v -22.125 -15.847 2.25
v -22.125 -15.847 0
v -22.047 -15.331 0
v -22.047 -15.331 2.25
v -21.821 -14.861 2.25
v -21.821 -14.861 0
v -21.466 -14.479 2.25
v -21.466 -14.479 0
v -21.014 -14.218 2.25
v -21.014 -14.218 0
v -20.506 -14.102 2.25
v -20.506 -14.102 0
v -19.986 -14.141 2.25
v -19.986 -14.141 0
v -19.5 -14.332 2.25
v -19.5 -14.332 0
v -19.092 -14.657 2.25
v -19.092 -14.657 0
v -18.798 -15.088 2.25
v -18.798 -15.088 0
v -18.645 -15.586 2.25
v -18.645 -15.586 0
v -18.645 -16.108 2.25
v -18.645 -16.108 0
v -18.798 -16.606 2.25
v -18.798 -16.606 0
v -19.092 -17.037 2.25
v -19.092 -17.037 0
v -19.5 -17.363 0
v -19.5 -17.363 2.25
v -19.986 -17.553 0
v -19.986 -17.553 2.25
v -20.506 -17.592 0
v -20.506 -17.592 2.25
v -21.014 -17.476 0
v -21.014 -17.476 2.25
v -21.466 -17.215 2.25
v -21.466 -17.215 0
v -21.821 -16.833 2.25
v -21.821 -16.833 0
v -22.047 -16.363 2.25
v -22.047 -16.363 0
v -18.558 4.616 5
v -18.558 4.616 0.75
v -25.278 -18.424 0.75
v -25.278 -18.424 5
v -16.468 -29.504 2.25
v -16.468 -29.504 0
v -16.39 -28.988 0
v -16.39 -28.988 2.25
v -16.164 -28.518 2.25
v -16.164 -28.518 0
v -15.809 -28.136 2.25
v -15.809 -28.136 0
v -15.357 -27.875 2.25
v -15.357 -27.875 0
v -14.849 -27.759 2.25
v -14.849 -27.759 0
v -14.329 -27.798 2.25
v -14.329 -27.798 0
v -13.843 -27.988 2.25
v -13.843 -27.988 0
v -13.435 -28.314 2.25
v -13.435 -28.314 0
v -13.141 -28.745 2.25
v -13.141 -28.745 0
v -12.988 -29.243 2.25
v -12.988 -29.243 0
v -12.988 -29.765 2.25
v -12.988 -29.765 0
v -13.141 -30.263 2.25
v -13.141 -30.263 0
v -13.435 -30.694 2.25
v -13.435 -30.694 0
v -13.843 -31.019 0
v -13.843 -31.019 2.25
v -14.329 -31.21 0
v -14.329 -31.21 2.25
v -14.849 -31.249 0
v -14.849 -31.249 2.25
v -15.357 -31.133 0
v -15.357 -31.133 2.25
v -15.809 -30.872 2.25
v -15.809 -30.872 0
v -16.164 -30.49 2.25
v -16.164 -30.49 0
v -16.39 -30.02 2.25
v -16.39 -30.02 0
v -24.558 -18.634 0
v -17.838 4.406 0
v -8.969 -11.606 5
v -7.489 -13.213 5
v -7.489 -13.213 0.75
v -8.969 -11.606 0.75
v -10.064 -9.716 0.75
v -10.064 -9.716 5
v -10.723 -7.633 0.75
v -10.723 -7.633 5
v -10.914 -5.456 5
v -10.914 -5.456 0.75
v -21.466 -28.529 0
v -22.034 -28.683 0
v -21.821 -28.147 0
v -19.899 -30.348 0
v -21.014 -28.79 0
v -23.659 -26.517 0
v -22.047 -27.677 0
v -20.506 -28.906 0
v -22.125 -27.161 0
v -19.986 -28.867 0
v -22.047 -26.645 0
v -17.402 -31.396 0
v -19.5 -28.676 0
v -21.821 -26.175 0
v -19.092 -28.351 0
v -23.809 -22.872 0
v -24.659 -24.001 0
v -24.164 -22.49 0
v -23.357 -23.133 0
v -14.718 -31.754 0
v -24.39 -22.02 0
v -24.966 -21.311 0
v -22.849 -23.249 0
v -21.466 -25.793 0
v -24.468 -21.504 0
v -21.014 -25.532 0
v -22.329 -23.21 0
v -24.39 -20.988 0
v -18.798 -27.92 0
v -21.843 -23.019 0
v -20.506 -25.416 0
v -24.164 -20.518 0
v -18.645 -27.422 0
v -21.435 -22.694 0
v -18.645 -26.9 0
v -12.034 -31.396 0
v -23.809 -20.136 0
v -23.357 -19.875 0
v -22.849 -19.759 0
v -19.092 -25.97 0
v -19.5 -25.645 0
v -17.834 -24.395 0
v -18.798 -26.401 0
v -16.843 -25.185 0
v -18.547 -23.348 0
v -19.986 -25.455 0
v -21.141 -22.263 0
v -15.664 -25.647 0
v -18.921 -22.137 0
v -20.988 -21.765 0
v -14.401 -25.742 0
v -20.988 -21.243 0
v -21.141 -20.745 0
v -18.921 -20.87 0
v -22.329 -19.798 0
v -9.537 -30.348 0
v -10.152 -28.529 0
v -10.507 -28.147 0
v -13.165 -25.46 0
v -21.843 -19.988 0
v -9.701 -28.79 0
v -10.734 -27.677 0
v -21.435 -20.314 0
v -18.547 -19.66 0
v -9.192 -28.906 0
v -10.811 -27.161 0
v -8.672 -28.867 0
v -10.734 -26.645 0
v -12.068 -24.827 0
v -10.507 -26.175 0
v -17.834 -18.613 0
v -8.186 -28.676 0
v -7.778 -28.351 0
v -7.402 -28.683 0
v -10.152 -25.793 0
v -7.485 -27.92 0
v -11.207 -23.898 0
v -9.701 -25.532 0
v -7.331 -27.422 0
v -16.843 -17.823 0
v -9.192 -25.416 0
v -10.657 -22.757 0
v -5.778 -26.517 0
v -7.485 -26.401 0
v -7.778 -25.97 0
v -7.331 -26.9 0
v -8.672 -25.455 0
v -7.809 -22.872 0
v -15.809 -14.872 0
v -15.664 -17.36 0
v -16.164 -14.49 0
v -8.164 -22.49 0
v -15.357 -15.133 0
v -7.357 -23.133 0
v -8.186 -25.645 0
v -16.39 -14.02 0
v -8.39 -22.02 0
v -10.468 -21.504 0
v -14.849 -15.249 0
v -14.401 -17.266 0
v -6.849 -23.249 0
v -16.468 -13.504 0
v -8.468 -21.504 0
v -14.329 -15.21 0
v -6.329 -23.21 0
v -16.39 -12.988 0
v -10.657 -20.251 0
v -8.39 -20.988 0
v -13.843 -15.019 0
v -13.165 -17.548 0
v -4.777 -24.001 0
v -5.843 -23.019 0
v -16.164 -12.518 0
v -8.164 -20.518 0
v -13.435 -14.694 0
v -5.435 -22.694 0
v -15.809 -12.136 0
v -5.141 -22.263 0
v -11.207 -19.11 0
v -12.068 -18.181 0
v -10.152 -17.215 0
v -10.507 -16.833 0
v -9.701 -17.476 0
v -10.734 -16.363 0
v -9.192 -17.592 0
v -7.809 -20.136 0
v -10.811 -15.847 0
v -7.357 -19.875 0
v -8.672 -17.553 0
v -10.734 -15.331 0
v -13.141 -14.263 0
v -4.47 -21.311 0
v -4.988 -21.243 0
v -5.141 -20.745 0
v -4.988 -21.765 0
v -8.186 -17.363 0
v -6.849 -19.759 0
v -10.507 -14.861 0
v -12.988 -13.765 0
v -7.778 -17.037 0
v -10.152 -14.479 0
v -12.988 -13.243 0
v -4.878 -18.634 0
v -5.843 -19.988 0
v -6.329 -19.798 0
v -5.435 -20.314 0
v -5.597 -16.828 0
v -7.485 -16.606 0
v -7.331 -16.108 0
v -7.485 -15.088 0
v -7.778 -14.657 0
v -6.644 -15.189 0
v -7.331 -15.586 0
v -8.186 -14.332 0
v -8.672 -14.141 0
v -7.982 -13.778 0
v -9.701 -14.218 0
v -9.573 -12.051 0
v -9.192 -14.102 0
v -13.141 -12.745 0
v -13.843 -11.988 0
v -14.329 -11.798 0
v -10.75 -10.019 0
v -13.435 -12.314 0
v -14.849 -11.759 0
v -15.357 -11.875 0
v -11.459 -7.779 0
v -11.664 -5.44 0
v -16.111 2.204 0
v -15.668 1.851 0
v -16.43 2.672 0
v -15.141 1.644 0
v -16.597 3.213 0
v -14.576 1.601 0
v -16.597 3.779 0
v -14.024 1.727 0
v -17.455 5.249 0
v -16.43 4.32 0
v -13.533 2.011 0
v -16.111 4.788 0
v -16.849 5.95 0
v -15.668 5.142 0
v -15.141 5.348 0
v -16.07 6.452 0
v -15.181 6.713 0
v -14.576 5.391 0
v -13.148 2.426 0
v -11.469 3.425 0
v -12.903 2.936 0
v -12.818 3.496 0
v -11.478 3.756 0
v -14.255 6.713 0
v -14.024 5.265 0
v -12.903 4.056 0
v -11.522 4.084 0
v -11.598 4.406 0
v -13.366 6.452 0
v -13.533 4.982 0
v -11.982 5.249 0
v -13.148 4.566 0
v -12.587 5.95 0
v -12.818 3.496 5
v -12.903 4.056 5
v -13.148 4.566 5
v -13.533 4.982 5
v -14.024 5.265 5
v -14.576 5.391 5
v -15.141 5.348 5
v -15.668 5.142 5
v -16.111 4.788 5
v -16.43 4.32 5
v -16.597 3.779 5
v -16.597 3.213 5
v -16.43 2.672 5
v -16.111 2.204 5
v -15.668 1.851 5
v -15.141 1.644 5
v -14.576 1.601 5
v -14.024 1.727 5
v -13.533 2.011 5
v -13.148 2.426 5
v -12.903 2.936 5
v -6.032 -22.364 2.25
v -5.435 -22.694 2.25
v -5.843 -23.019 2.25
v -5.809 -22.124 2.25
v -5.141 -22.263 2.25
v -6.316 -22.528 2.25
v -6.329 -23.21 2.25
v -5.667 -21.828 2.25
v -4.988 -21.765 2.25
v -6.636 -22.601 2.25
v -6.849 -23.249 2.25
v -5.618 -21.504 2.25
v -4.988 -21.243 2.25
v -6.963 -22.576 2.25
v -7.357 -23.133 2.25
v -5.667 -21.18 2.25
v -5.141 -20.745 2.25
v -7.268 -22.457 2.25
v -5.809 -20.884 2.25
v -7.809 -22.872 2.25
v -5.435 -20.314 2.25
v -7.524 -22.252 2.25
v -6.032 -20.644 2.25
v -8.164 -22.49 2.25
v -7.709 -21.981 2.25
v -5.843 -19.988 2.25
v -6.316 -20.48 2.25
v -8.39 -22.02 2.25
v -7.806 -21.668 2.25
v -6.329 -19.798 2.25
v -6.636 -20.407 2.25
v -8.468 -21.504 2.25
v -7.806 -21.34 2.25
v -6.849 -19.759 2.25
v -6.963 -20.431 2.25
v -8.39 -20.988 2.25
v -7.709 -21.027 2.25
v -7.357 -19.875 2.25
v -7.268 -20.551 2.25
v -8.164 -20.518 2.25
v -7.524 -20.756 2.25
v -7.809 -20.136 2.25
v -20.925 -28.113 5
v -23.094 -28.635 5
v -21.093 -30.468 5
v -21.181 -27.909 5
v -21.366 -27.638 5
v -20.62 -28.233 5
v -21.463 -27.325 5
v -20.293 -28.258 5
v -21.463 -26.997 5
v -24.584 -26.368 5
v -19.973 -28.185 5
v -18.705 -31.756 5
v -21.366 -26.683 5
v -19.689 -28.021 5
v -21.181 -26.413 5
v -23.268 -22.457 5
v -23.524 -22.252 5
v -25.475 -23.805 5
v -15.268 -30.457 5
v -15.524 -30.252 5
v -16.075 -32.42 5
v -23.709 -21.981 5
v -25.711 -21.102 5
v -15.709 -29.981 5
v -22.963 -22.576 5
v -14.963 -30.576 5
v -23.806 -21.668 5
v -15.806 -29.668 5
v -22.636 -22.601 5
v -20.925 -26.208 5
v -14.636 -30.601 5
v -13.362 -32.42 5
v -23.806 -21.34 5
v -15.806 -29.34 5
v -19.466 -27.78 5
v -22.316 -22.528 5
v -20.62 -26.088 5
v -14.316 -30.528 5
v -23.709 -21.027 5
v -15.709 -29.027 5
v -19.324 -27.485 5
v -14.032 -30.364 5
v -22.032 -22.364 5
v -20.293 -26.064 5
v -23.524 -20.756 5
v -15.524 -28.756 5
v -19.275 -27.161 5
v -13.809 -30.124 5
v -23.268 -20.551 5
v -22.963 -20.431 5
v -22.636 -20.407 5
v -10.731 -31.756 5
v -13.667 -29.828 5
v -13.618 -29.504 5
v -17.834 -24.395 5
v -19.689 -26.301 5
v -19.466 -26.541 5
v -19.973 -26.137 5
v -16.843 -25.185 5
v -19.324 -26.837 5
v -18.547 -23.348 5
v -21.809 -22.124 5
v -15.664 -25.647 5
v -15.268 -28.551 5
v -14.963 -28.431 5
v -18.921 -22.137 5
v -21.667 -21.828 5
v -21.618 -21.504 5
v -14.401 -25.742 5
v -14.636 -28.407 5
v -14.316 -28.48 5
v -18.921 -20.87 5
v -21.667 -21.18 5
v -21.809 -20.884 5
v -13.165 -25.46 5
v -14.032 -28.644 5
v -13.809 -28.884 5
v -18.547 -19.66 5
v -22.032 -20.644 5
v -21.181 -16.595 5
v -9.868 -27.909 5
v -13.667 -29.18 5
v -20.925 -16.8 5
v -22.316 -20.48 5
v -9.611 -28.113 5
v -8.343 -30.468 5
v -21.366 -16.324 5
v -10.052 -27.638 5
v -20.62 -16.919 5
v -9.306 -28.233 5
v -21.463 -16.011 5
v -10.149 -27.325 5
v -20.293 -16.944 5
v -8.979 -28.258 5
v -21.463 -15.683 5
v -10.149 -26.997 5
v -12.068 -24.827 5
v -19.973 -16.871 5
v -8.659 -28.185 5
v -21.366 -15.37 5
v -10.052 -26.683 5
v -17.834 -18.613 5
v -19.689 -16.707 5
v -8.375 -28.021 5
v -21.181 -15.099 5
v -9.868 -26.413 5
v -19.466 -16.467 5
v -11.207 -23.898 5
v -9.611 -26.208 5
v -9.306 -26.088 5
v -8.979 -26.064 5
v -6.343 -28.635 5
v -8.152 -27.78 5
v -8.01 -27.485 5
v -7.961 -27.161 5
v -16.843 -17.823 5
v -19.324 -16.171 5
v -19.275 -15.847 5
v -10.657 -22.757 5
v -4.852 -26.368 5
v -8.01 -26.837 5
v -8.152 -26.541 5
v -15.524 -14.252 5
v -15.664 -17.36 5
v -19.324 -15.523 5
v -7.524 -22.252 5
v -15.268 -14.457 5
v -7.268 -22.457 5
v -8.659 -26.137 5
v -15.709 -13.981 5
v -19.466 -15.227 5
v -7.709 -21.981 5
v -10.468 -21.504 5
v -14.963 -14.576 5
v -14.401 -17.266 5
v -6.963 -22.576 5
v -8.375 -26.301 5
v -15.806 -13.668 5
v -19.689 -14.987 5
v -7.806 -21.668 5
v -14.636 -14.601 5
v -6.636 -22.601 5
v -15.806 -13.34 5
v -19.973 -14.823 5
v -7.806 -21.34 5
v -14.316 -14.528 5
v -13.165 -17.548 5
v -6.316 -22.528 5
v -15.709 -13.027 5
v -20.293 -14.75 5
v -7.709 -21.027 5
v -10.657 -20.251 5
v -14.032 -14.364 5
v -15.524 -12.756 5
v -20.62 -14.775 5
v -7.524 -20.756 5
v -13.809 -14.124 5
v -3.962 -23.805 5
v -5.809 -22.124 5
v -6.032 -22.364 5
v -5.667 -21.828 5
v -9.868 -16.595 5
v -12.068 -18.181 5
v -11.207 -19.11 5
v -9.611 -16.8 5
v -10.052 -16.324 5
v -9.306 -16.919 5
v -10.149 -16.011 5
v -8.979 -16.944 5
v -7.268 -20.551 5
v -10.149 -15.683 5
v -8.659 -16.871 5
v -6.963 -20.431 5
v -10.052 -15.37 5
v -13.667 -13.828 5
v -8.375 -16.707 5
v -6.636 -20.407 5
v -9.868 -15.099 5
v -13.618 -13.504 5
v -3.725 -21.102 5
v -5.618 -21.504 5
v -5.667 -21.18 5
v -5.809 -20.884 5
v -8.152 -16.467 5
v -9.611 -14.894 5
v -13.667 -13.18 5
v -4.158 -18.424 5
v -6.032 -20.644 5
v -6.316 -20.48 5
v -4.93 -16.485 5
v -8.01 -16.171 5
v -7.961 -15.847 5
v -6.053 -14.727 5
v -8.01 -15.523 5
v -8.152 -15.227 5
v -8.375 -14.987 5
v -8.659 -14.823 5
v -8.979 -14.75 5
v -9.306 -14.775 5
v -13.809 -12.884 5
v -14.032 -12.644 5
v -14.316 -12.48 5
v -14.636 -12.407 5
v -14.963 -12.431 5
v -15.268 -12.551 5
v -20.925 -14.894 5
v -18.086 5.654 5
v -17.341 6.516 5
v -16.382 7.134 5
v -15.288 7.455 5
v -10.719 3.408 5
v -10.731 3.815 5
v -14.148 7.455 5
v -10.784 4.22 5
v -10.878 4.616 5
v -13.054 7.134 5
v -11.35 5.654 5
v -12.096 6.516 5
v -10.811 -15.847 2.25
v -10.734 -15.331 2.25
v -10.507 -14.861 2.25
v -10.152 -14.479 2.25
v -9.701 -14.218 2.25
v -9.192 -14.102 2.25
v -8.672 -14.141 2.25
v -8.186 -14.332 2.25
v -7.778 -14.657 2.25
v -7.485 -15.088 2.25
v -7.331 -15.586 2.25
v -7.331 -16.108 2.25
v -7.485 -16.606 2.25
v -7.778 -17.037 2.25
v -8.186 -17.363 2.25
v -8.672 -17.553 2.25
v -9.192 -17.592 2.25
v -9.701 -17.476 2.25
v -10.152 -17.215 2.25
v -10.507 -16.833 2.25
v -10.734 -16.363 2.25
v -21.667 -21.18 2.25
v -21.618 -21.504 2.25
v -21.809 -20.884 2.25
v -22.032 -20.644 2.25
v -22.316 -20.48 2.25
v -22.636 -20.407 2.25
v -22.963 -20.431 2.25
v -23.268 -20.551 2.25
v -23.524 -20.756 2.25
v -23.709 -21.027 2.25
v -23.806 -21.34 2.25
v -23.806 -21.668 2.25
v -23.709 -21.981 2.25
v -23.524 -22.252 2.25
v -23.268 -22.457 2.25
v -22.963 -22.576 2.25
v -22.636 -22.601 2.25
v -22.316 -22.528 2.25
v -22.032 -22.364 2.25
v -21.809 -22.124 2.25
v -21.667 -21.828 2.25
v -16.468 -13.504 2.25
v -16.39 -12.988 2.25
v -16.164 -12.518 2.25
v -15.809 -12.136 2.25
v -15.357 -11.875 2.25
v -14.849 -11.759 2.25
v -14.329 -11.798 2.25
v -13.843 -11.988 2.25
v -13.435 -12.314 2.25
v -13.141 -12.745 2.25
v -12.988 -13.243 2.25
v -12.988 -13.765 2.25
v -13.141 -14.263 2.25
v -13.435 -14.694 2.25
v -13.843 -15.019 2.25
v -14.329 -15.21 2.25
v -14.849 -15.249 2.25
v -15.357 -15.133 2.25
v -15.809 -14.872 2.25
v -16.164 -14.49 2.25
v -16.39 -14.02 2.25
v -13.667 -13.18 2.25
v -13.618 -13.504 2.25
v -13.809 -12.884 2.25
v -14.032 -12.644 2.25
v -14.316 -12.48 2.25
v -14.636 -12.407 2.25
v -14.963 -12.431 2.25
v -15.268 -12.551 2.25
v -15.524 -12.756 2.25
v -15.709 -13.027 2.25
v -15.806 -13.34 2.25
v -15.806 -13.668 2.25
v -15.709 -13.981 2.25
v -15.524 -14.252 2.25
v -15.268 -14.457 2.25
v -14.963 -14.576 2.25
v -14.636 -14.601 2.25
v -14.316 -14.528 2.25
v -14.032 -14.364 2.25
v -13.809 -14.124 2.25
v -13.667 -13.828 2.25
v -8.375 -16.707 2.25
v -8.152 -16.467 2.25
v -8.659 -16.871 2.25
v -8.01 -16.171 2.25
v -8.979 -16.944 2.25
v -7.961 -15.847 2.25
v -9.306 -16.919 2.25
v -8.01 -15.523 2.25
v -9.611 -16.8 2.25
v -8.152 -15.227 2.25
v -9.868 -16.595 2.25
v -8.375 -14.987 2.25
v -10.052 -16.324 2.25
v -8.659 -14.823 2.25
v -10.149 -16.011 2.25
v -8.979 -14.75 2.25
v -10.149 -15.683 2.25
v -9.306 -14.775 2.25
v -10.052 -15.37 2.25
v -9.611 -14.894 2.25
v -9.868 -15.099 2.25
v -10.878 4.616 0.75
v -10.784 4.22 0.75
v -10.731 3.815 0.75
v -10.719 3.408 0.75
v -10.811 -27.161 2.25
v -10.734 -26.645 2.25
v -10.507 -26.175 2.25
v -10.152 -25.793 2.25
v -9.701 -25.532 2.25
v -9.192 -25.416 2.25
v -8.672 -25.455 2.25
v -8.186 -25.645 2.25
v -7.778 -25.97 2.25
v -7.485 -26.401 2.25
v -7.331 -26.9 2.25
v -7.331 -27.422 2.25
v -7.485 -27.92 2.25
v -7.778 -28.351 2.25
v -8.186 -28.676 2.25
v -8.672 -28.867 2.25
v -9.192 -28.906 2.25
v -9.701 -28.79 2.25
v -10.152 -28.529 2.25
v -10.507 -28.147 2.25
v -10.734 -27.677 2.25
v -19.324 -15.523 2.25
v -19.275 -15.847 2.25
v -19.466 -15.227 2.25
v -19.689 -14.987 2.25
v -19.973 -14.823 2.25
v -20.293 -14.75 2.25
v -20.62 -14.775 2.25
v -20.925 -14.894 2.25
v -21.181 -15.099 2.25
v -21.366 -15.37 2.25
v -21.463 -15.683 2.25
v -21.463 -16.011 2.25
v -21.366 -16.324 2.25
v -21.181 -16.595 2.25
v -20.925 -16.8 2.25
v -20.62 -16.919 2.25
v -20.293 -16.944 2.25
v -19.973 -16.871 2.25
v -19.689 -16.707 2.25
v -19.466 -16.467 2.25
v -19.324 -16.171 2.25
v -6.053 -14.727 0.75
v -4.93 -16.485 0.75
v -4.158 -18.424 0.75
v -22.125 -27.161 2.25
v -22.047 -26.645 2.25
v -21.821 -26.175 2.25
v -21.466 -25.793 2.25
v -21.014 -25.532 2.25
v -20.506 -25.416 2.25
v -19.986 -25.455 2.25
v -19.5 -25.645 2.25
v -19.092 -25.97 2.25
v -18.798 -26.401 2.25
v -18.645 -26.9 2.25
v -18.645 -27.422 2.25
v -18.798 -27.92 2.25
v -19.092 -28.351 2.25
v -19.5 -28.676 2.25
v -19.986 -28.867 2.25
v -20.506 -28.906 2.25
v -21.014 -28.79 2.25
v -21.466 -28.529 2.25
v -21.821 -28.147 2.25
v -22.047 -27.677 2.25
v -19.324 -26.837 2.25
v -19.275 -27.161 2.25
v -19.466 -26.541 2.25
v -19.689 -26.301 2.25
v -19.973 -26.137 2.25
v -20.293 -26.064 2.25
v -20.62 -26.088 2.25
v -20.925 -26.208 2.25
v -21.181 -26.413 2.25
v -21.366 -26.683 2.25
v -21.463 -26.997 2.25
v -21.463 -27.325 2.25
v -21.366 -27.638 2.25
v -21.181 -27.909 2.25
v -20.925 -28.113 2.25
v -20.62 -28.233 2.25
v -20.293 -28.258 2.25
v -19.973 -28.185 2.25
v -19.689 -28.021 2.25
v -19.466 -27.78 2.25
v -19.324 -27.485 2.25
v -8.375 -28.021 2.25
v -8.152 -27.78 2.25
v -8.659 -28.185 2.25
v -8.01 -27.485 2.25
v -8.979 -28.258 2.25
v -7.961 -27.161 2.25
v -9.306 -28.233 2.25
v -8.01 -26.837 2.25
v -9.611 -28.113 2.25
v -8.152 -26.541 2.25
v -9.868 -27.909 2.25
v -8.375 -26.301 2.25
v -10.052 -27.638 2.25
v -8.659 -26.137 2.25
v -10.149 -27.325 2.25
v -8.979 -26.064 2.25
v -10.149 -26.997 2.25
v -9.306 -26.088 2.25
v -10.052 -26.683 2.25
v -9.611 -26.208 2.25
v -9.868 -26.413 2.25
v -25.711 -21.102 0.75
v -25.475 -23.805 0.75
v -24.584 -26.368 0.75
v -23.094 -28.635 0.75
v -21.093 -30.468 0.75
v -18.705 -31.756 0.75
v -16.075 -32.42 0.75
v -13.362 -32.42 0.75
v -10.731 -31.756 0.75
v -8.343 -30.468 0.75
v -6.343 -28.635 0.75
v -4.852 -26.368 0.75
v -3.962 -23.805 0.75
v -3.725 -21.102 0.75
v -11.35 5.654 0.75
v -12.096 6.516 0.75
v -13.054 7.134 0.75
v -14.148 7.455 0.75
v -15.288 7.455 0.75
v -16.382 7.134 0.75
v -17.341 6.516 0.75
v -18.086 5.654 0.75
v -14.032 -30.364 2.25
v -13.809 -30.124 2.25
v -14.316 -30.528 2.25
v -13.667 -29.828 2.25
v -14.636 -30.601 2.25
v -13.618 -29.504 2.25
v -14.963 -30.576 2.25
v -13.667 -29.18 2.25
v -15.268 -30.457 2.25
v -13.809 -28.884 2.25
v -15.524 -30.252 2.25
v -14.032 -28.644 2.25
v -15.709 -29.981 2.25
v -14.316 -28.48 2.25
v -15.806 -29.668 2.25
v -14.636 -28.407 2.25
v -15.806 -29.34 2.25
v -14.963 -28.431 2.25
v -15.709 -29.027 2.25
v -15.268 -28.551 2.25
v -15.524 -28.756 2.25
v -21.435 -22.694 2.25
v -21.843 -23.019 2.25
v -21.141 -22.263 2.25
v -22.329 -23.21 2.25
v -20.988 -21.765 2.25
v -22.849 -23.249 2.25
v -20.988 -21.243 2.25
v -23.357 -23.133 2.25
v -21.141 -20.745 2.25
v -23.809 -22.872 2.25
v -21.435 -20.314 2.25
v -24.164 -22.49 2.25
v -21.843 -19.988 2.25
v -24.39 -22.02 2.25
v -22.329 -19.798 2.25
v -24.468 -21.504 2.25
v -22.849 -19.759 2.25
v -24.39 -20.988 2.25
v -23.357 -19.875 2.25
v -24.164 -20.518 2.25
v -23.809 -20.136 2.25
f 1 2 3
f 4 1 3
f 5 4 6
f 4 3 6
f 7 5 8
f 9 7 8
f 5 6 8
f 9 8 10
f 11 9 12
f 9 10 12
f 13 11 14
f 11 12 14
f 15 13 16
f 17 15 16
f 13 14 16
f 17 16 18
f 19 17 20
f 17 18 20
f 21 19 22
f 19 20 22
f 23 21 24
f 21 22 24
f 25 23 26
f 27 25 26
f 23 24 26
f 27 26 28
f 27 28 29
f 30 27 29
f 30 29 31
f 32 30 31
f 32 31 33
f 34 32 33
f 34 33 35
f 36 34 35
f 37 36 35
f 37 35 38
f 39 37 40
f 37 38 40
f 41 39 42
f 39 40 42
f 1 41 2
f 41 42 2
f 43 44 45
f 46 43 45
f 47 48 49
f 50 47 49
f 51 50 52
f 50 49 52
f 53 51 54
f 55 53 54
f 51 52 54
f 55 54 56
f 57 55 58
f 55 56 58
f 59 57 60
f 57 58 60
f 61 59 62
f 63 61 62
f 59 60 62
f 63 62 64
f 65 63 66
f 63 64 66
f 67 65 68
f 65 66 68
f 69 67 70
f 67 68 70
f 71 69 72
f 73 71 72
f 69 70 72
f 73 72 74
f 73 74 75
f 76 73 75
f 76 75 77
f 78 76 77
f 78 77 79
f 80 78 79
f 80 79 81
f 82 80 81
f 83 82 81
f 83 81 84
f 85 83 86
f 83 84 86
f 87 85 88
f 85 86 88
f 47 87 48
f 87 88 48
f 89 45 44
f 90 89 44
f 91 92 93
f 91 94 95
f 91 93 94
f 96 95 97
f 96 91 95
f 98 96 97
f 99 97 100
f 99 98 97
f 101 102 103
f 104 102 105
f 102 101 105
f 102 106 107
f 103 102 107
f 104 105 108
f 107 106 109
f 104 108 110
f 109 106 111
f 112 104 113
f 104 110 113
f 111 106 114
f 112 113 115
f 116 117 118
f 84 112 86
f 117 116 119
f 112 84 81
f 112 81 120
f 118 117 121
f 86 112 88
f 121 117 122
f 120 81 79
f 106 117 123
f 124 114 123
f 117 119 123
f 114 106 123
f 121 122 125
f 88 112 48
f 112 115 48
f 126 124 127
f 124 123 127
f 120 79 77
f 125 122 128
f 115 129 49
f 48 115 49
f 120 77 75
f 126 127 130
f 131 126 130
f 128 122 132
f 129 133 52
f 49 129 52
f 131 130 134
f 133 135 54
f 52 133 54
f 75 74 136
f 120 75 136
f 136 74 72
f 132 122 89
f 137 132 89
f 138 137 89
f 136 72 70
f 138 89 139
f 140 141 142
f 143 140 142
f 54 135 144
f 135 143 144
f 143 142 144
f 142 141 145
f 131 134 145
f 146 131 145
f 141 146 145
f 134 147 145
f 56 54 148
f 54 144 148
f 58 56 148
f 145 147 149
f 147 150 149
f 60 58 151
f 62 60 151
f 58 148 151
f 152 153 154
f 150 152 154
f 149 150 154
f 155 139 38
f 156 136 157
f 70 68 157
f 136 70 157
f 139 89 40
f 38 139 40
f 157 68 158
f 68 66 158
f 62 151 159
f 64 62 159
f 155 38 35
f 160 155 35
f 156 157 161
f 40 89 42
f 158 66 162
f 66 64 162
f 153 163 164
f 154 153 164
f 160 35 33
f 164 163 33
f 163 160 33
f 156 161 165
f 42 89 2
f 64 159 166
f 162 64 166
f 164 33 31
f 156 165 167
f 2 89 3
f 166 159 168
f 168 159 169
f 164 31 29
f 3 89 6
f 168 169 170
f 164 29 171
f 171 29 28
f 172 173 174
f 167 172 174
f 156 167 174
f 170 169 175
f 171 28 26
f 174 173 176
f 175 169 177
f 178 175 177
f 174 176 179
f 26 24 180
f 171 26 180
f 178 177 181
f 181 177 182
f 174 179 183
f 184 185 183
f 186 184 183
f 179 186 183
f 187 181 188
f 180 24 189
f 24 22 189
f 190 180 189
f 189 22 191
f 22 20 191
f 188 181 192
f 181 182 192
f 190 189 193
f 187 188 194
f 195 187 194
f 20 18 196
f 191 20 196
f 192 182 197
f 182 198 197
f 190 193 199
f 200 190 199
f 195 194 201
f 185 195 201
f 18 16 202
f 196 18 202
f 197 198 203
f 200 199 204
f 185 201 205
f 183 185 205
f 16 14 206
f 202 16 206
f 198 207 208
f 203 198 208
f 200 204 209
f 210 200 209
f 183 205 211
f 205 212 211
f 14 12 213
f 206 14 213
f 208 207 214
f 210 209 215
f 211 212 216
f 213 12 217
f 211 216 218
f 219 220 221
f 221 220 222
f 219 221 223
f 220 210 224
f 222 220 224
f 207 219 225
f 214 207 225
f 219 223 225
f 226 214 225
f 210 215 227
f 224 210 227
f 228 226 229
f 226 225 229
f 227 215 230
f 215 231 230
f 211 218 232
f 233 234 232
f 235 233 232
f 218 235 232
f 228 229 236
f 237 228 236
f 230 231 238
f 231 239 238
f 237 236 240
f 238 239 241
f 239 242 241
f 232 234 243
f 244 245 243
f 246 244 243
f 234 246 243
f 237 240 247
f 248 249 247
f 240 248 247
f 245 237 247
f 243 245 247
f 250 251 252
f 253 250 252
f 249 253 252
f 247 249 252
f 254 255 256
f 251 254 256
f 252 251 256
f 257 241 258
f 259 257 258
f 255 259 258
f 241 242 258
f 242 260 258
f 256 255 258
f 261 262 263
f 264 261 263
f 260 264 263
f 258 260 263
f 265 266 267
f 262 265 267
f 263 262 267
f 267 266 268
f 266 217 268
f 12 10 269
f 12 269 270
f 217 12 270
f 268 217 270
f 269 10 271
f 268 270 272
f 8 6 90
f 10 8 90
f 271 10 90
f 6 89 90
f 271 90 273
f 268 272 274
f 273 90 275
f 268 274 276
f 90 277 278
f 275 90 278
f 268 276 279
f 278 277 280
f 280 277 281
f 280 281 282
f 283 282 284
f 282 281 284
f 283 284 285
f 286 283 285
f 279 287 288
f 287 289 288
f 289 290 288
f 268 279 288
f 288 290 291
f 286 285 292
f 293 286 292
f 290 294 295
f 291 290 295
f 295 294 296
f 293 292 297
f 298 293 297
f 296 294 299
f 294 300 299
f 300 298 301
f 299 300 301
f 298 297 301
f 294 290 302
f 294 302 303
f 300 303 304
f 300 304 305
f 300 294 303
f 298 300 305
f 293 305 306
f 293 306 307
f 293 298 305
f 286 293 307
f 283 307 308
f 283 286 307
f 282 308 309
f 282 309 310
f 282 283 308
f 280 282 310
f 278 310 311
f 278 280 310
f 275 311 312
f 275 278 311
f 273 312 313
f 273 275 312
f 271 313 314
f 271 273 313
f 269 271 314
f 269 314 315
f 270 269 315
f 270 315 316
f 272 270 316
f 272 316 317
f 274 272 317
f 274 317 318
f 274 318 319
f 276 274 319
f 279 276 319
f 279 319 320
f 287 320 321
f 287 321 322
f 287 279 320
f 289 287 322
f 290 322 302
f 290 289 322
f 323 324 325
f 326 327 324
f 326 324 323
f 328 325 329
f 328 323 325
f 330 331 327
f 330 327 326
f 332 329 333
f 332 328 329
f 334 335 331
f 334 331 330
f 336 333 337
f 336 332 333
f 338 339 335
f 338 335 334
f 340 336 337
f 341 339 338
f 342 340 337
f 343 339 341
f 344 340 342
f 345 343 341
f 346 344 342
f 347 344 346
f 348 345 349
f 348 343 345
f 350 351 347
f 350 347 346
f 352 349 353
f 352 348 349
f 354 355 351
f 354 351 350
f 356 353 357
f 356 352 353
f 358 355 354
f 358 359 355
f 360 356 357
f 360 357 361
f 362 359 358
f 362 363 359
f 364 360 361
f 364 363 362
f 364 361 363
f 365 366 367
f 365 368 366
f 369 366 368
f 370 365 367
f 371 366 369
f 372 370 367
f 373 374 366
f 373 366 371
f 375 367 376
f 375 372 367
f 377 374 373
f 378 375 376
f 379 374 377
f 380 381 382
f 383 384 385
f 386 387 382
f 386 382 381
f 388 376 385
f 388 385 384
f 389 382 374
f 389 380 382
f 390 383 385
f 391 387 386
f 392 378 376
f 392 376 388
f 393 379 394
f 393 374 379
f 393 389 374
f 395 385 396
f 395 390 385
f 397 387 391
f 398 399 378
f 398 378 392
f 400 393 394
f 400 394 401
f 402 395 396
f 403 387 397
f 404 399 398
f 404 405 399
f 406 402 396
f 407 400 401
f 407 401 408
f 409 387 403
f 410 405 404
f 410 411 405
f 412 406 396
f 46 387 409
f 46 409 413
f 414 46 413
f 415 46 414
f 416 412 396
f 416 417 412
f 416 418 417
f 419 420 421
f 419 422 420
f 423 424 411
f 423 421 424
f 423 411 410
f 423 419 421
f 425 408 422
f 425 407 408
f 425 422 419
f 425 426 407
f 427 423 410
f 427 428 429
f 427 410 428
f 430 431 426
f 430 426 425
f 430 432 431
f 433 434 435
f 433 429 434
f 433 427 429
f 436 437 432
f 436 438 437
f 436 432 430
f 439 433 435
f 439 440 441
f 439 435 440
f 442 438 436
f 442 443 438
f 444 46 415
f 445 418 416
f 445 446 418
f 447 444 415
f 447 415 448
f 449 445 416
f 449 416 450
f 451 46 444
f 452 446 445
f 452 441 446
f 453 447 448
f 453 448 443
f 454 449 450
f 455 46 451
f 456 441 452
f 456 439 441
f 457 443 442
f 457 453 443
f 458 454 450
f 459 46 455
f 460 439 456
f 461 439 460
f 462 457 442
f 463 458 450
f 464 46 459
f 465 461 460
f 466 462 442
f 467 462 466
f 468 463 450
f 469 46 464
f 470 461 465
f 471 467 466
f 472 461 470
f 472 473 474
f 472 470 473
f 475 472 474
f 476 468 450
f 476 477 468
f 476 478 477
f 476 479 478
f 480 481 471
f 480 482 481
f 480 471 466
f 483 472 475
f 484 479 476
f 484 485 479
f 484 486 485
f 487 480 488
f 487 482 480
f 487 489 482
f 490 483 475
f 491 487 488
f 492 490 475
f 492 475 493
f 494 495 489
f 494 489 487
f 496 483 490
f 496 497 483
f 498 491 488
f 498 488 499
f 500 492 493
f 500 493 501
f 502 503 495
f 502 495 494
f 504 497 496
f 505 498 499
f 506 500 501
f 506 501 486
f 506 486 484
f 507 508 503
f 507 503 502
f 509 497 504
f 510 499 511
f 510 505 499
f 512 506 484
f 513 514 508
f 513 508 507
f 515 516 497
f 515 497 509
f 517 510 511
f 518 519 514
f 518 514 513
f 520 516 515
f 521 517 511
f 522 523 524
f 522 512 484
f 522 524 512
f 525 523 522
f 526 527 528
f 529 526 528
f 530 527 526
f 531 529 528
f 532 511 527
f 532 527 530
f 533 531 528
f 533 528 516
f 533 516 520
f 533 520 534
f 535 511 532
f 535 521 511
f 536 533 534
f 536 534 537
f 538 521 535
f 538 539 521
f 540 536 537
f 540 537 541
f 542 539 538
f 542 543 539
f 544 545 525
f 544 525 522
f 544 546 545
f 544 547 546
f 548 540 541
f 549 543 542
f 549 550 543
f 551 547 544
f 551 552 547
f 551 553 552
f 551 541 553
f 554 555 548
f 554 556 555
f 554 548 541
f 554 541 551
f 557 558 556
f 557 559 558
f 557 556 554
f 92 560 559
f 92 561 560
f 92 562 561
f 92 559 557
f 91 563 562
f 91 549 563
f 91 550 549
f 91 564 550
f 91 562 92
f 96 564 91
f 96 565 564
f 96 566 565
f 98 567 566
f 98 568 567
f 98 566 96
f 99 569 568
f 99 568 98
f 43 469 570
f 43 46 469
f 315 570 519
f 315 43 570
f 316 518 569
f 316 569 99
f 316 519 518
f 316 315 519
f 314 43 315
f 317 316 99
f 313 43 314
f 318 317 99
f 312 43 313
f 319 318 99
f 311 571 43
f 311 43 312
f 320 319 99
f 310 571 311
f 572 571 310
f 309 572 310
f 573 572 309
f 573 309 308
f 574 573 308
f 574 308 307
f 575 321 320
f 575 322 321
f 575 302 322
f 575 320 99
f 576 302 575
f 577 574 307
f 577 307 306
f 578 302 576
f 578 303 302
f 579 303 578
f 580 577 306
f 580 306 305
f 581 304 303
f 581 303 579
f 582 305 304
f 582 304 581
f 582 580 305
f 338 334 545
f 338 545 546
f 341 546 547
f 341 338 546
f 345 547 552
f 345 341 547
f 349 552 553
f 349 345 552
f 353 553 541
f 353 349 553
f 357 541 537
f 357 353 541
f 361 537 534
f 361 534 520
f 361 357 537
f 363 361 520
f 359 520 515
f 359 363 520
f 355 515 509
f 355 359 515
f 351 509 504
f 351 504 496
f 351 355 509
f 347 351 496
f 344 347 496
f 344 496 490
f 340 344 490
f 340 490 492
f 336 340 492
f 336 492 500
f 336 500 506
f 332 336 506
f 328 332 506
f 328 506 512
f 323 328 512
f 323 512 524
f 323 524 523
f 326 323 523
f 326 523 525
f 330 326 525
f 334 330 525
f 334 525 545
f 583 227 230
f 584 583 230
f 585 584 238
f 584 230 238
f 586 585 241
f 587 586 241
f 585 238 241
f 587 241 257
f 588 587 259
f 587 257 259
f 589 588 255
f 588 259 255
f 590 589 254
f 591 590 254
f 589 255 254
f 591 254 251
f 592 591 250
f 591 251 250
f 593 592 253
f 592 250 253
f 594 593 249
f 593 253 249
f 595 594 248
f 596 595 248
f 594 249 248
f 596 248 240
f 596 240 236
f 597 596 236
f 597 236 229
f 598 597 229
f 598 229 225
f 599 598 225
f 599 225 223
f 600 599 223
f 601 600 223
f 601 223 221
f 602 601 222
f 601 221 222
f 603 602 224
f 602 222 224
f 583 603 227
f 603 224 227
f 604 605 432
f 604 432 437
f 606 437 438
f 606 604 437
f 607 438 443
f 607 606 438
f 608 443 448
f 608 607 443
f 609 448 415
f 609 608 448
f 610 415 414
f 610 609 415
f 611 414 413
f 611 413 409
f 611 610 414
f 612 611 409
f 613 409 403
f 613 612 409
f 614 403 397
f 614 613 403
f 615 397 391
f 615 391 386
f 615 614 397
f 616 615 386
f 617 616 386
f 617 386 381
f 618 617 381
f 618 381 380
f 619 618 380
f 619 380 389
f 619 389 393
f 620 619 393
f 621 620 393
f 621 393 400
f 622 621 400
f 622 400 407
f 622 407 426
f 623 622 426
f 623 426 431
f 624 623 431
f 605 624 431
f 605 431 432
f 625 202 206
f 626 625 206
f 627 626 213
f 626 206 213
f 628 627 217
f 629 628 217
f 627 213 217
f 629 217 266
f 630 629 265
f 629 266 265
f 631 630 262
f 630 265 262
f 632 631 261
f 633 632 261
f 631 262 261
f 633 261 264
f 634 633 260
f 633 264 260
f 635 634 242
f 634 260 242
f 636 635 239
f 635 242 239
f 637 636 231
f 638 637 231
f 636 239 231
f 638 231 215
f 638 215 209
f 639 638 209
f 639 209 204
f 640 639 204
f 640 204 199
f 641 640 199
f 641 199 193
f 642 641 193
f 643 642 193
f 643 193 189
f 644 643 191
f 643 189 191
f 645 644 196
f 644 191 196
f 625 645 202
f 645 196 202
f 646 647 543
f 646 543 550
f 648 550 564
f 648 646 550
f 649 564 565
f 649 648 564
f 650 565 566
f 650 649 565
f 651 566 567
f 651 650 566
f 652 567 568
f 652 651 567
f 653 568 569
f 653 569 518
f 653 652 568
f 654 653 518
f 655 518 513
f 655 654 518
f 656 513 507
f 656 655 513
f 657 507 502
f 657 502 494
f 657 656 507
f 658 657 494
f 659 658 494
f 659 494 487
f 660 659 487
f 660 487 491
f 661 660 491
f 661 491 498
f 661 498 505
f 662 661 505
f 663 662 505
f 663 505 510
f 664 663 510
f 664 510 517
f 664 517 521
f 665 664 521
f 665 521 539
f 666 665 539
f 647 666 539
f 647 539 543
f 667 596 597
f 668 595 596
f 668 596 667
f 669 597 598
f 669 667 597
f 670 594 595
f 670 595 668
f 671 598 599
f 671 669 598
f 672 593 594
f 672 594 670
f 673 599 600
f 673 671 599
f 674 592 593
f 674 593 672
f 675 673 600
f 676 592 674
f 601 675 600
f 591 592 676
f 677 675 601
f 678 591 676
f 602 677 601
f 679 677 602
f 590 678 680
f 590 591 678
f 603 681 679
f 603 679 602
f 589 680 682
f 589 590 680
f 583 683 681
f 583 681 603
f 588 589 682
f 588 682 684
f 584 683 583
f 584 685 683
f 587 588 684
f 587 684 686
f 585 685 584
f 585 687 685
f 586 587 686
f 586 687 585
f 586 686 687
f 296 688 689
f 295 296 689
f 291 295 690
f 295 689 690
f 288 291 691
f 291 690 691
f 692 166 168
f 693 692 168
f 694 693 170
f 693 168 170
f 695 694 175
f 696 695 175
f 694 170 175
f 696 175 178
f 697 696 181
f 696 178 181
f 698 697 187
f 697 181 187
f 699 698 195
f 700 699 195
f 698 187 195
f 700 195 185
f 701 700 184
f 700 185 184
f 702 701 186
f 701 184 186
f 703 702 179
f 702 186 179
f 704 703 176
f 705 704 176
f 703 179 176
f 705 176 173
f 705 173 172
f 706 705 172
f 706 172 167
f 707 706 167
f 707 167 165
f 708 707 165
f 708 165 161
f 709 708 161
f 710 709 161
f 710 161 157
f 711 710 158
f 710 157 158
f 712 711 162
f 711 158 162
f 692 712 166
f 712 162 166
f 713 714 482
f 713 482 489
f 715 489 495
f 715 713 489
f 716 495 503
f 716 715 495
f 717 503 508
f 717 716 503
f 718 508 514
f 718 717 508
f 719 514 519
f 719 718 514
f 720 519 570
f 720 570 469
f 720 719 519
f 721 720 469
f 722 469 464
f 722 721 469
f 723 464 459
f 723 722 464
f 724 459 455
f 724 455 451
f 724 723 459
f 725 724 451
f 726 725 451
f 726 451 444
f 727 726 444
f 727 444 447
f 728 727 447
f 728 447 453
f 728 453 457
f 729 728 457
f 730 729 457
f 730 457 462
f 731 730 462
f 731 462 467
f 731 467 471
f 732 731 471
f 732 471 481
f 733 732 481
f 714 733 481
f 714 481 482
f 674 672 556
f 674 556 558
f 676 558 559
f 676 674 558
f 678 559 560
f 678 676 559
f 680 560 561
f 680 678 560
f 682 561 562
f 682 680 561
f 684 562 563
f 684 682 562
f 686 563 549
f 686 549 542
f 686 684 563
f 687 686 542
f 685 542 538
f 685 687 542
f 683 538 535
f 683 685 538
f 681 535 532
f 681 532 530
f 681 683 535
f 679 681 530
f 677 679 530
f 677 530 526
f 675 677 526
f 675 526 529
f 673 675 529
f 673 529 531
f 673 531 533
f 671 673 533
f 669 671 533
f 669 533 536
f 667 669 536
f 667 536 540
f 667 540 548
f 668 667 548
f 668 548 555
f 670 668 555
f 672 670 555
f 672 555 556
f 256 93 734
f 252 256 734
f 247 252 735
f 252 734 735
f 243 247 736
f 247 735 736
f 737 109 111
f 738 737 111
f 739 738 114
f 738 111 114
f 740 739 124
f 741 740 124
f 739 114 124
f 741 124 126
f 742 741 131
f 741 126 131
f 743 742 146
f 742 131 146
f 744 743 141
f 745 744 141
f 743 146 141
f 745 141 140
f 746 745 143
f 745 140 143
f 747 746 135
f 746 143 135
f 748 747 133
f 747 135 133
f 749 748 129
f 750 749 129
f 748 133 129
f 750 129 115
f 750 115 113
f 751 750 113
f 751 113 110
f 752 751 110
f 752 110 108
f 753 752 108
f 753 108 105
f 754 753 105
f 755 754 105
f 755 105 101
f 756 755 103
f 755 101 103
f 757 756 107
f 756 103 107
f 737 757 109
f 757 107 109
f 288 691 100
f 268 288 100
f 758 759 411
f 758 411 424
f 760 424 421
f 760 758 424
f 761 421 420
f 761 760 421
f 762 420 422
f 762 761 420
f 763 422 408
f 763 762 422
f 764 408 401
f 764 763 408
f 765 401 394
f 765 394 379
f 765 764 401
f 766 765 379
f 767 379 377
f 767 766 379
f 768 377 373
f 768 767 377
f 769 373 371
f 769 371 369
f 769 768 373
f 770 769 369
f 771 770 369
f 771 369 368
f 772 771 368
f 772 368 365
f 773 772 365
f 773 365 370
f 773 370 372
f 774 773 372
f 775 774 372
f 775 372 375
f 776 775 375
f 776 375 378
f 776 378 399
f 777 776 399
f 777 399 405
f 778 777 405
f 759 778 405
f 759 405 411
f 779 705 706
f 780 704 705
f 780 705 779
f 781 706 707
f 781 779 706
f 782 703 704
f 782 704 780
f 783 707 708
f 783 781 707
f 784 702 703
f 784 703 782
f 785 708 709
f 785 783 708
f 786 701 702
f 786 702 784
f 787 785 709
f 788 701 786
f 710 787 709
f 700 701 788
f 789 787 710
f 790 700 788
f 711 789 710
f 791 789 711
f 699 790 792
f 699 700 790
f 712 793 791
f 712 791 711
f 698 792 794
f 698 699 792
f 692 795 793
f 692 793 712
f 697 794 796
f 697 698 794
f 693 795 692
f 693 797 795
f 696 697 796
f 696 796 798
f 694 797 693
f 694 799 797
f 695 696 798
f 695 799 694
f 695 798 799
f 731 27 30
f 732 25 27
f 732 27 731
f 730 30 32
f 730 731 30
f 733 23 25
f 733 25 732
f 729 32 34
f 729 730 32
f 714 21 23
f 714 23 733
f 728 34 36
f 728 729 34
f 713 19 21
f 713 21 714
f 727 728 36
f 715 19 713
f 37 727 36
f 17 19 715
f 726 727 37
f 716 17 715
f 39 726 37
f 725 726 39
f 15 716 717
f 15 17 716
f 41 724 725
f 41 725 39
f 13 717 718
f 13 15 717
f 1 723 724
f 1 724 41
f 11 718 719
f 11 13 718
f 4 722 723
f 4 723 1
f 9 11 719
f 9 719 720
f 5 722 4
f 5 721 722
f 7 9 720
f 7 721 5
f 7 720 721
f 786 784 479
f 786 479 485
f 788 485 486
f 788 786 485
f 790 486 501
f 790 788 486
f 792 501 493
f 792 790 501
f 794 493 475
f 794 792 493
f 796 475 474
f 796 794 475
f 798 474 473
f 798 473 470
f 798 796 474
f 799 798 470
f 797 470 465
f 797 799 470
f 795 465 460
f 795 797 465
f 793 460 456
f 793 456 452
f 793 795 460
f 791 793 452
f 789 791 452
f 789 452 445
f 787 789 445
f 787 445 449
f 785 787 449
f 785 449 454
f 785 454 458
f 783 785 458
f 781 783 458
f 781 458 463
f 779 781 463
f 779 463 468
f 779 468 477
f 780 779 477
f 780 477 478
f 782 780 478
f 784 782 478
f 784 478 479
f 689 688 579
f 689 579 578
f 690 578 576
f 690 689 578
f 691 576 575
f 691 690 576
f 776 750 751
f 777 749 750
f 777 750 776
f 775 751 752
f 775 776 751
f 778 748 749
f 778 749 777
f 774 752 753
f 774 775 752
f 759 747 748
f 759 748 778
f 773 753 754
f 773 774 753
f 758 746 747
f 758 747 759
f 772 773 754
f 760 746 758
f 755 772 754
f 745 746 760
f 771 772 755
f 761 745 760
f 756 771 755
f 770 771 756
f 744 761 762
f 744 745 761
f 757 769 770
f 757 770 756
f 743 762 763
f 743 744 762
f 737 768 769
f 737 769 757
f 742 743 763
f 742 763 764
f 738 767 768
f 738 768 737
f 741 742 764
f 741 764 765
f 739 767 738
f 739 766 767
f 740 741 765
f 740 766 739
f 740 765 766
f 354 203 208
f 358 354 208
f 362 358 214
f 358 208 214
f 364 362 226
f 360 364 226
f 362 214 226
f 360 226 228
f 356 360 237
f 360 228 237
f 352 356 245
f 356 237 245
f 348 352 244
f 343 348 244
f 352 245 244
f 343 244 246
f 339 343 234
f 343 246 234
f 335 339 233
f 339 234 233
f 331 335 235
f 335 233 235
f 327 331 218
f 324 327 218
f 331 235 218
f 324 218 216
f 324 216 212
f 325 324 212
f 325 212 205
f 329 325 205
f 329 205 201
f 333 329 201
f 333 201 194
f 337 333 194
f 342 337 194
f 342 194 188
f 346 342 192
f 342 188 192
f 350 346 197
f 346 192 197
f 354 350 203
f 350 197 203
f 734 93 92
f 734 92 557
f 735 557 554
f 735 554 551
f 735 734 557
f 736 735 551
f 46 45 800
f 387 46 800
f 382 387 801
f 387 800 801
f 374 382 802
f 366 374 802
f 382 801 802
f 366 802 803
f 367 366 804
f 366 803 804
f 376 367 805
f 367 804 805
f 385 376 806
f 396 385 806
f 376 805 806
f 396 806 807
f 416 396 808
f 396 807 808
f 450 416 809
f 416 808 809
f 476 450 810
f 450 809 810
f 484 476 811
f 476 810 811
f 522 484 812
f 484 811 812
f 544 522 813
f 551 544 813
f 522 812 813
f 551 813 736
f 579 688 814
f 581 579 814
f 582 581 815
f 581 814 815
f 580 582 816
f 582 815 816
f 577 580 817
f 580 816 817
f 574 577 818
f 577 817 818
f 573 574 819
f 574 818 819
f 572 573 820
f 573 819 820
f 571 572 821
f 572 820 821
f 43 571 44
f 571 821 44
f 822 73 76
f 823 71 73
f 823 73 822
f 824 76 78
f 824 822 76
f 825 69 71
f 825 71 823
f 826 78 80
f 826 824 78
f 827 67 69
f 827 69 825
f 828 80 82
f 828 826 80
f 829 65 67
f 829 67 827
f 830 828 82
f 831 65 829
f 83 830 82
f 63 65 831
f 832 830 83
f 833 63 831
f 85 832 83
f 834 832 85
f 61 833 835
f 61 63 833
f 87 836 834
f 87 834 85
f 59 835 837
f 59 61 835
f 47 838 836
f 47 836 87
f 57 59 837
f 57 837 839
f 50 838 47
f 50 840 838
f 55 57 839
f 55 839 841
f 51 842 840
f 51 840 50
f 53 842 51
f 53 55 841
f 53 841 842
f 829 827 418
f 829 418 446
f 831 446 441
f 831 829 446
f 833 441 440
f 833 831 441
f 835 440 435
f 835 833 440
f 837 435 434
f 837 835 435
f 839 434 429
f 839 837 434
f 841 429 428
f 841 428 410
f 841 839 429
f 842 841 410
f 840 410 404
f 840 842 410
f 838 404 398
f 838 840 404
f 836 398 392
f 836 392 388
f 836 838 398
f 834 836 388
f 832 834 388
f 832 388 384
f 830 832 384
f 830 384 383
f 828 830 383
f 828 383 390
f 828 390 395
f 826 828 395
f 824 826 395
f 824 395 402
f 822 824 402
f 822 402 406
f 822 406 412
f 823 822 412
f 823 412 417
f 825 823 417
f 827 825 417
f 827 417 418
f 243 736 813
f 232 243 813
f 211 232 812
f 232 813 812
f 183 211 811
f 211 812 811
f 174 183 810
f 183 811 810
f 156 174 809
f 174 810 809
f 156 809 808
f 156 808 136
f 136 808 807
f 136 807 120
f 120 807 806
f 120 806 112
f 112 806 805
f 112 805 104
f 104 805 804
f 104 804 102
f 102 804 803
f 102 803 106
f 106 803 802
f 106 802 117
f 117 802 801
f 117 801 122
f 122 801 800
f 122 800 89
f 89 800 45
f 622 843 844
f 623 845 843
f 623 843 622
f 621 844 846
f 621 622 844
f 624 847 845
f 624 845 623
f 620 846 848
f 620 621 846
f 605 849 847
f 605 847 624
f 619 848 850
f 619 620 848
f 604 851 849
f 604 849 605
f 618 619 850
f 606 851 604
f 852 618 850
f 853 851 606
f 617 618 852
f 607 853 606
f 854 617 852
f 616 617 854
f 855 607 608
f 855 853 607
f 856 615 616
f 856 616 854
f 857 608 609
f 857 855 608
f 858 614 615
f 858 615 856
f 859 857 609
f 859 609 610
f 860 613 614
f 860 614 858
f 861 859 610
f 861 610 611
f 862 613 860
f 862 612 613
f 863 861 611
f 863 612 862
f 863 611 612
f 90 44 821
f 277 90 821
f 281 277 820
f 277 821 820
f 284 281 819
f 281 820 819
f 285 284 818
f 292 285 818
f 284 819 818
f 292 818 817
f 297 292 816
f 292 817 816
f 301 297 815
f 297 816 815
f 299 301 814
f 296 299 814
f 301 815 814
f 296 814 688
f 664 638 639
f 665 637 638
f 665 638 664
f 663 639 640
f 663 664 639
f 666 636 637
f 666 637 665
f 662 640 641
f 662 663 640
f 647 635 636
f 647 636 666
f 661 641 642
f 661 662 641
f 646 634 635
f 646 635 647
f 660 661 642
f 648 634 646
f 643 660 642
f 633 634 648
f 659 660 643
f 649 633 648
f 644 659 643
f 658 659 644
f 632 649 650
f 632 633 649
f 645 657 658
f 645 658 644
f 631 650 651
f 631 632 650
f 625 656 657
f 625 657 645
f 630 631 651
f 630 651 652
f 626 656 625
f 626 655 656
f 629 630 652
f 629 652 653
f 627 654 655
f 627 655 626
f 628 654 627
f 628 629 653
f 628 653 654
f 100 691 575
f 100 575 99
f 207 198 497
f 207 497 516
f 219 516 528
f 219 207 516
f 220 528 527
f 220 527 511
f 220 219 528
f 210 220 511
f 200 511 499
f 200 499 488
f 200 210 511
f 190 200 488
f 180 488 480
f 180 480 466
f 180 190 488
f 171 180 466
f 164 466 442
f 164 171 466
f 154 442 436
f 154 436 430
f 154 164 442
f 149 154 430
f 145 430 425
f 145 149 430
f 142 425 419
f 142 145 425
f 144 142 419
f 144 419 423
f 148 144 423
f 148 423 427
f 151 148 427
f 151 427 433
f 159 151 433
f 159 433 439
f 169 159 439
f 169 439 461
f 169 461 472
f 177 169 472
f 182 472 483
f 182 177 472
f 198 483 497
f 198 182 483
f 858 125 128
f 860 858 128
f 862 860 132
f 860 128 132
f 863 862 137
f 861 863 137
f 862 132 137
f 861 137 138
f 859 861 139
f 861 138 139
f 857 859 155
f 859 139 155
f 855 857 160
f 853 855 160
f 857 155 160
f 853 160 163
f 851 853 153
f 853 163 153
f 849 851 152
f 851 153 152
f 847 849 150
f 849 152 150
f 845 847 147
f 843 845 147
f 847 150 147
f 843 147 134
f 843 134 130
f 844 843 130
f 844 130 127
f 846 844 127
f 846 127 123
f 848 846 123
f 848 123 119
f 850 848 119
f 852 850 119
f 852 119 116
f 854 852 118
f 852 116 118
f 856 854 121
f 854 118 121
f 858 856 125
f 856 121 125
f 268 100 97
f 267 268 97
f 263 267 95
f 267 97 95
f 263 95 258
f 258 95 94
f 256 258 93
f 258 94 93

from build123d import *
from build123d.topology import SkipClean

# Parameters (mm, degrees)
SKETCH1_R             = 1.9
SKETCH1_R_2           = 4.25
SKETCH1_R_3           = 1.1
BOSS_EXTRUDE1_DEPTH   = 5
SKETCH4_R             = 1.75
CUT_EXTRUDE3_DEPTH    = 2.25
CORTAR_EXTRUIR1_DEPTH = 10
REDONDEO1_R           = 10
CHAFL_N1_SIZE         = 0.75


with BuildPart() as part:
    # Sketch1 → Boss-Extrude1 (new body)
    with BuildSketch(Plane.XY):
        with BuildLine():
            Line((-18.558111277, 4.616096398), (-25.278111277, -18.423903602))
            ThreePointArc((-25.278111277, -18.423903602), (-14.718111277, -32.503903602), (-4.158111277, -18.423903602))
            Line((-4.158111277, -18.423903602), (-10.878111277, 4.616096398))
            ThreePointArc((-10.878111277, 4.616096398), (-14.718111277, 7.496096398), (-18.558111277, 4.616096398))
        make_face()
        with Locations((-14.718111277, 3.496096398)):
            Circle(SKETCH1_R, mode=Mode.SUBTRACT)
        with Locations((-14.718111277, -21.503903602)):
            Circle(SKETCH1_R_2, mode=Mode.SUBTRACT)
        with Locations((-6.718111277, -21.503903602)):
            Circle(SKETCH1_R_3, mode=Mode.SUBTRACT)
        with Locations((-9.061257027, -27.160757851)):
            Circle(SKETCH1_R_3, mode=Mode.SUBTRACT)
        with Locations((-14.718111277, -29.503903602)):
            Circle(SKETCH1_R_3, mode=Mode.SUBTRACT)
        with Locations((-20.374965526, -27.160757851)):
            Circle(SKETCH1_R_3, mode=Mode.SUBTRACT)
        with Locations((-22.718111277, -21.503903602)):
            Circle(SKETCH1_R_3, mode=Mode.SUBTRACT)
        with Locations((-20.374965526, -15.847049352)):
            Circle(SKETCH1_R_3, mode=Mode.SUBTRACT)
        with Locations((-14.718111277, -13.503903602)):
            Circle(SKETCH1_R_3, mode=Mode.SUBTRACT)
        with Locations((-9.061257027, -15.847049352)):
            Circle(SKETCH1_R_3, mode=Mode.SUBTRACT)
    extrude(amount=BOSS_EXTRUDE1_DEPTH)

    # Sketch4 → Cut-Extrude3 (cut)
    with BuildSketch(Plane(origin=(0, 0, 0), x_dir=(-1, 0, 0), z_dir=(0, 0, -1))):
        with Locations((22.718111277, -21.503903602)):
            Circle(SKETCH4_R)
        with Locations((20.374965526, -27.160757851)):
            Circle(SKETCH4_R)
        with Locations((14.718111277, -29.503903602)):
            Circle(SKETCH4_R)
        with Locations((9.061257027, -27.160757851)):
            Circle(SKETCH4_R)
        with Locations((6.718111277, -21.503903602)):
            Circle(SKETCH4_R)
        with Locations((9.061257027, -15.847049352)):
            Circle(SKETCH4_R)
        with Locations((14.718111277, -13.503903602)):
            Circle(SKETCH4_R)
        with Locations((20.374965526, -15.847049352)):
            Circle(SKETCH4_R)
    extrude(amount=-CUT_EXTRUDE3_DEPTH, mode=Mode.SUBTRACT)

    # Croquis1 → Cortar-Extruir1 (cut)
    with SkipClean():  # the faces are left unmerged after this step: merging them gives an invalid solid
        with BuildSketch(Plane(origin=(0, 0, 0), x_dir=(-1, 0, 0), z_dir=(0, 0, -1))):
            with BuildLine():
                Line((10.719078773, 3.408124606), (11.039054977, -11.13739287))
                ThreePointArc((11.039054977, -11.13739287), (6.720549727, -13.951486157), (4.158111277, -18.423903602))
                Line((4.158111277, -18.423903602), (10.878111277, 4.616096398))
                ThreePointArc((10.878111277, 4.616096398), (10.752331831, 4.018201167), (10.719078773, 3.408124606))
            make_face()
        extrude(amount=-CORTAR_EXTRUIR1_DEPTH, mode=Mode.SUBTRACT)

    # Redondeo1
    redondeo1_edges = [part.edges().sort_by_distance(p)[0] for p in [
        (-11.039054977, -11.13739287, 2.5),
    ]]
    fillet(redondeo1_edges, radius=REDONDEO1_R)

    # Chaflán1
    chafl_n1_edges = [part.edges().sort_by_distance(p)[0] for p in [
        (-10.816579688, -1.024083907, 0),
        (-10.06427699, -9.715796647, 0),
        (-14.718111277, -32.503903602, 0),
        (-21.918111277, -6.903903602, 0),
        (-14.718111277, 7.496096398, 0),
    ]]
    chamfer(chafl_n1_edges, length=CHAFL_N1_SIZE)


solid = part.part
